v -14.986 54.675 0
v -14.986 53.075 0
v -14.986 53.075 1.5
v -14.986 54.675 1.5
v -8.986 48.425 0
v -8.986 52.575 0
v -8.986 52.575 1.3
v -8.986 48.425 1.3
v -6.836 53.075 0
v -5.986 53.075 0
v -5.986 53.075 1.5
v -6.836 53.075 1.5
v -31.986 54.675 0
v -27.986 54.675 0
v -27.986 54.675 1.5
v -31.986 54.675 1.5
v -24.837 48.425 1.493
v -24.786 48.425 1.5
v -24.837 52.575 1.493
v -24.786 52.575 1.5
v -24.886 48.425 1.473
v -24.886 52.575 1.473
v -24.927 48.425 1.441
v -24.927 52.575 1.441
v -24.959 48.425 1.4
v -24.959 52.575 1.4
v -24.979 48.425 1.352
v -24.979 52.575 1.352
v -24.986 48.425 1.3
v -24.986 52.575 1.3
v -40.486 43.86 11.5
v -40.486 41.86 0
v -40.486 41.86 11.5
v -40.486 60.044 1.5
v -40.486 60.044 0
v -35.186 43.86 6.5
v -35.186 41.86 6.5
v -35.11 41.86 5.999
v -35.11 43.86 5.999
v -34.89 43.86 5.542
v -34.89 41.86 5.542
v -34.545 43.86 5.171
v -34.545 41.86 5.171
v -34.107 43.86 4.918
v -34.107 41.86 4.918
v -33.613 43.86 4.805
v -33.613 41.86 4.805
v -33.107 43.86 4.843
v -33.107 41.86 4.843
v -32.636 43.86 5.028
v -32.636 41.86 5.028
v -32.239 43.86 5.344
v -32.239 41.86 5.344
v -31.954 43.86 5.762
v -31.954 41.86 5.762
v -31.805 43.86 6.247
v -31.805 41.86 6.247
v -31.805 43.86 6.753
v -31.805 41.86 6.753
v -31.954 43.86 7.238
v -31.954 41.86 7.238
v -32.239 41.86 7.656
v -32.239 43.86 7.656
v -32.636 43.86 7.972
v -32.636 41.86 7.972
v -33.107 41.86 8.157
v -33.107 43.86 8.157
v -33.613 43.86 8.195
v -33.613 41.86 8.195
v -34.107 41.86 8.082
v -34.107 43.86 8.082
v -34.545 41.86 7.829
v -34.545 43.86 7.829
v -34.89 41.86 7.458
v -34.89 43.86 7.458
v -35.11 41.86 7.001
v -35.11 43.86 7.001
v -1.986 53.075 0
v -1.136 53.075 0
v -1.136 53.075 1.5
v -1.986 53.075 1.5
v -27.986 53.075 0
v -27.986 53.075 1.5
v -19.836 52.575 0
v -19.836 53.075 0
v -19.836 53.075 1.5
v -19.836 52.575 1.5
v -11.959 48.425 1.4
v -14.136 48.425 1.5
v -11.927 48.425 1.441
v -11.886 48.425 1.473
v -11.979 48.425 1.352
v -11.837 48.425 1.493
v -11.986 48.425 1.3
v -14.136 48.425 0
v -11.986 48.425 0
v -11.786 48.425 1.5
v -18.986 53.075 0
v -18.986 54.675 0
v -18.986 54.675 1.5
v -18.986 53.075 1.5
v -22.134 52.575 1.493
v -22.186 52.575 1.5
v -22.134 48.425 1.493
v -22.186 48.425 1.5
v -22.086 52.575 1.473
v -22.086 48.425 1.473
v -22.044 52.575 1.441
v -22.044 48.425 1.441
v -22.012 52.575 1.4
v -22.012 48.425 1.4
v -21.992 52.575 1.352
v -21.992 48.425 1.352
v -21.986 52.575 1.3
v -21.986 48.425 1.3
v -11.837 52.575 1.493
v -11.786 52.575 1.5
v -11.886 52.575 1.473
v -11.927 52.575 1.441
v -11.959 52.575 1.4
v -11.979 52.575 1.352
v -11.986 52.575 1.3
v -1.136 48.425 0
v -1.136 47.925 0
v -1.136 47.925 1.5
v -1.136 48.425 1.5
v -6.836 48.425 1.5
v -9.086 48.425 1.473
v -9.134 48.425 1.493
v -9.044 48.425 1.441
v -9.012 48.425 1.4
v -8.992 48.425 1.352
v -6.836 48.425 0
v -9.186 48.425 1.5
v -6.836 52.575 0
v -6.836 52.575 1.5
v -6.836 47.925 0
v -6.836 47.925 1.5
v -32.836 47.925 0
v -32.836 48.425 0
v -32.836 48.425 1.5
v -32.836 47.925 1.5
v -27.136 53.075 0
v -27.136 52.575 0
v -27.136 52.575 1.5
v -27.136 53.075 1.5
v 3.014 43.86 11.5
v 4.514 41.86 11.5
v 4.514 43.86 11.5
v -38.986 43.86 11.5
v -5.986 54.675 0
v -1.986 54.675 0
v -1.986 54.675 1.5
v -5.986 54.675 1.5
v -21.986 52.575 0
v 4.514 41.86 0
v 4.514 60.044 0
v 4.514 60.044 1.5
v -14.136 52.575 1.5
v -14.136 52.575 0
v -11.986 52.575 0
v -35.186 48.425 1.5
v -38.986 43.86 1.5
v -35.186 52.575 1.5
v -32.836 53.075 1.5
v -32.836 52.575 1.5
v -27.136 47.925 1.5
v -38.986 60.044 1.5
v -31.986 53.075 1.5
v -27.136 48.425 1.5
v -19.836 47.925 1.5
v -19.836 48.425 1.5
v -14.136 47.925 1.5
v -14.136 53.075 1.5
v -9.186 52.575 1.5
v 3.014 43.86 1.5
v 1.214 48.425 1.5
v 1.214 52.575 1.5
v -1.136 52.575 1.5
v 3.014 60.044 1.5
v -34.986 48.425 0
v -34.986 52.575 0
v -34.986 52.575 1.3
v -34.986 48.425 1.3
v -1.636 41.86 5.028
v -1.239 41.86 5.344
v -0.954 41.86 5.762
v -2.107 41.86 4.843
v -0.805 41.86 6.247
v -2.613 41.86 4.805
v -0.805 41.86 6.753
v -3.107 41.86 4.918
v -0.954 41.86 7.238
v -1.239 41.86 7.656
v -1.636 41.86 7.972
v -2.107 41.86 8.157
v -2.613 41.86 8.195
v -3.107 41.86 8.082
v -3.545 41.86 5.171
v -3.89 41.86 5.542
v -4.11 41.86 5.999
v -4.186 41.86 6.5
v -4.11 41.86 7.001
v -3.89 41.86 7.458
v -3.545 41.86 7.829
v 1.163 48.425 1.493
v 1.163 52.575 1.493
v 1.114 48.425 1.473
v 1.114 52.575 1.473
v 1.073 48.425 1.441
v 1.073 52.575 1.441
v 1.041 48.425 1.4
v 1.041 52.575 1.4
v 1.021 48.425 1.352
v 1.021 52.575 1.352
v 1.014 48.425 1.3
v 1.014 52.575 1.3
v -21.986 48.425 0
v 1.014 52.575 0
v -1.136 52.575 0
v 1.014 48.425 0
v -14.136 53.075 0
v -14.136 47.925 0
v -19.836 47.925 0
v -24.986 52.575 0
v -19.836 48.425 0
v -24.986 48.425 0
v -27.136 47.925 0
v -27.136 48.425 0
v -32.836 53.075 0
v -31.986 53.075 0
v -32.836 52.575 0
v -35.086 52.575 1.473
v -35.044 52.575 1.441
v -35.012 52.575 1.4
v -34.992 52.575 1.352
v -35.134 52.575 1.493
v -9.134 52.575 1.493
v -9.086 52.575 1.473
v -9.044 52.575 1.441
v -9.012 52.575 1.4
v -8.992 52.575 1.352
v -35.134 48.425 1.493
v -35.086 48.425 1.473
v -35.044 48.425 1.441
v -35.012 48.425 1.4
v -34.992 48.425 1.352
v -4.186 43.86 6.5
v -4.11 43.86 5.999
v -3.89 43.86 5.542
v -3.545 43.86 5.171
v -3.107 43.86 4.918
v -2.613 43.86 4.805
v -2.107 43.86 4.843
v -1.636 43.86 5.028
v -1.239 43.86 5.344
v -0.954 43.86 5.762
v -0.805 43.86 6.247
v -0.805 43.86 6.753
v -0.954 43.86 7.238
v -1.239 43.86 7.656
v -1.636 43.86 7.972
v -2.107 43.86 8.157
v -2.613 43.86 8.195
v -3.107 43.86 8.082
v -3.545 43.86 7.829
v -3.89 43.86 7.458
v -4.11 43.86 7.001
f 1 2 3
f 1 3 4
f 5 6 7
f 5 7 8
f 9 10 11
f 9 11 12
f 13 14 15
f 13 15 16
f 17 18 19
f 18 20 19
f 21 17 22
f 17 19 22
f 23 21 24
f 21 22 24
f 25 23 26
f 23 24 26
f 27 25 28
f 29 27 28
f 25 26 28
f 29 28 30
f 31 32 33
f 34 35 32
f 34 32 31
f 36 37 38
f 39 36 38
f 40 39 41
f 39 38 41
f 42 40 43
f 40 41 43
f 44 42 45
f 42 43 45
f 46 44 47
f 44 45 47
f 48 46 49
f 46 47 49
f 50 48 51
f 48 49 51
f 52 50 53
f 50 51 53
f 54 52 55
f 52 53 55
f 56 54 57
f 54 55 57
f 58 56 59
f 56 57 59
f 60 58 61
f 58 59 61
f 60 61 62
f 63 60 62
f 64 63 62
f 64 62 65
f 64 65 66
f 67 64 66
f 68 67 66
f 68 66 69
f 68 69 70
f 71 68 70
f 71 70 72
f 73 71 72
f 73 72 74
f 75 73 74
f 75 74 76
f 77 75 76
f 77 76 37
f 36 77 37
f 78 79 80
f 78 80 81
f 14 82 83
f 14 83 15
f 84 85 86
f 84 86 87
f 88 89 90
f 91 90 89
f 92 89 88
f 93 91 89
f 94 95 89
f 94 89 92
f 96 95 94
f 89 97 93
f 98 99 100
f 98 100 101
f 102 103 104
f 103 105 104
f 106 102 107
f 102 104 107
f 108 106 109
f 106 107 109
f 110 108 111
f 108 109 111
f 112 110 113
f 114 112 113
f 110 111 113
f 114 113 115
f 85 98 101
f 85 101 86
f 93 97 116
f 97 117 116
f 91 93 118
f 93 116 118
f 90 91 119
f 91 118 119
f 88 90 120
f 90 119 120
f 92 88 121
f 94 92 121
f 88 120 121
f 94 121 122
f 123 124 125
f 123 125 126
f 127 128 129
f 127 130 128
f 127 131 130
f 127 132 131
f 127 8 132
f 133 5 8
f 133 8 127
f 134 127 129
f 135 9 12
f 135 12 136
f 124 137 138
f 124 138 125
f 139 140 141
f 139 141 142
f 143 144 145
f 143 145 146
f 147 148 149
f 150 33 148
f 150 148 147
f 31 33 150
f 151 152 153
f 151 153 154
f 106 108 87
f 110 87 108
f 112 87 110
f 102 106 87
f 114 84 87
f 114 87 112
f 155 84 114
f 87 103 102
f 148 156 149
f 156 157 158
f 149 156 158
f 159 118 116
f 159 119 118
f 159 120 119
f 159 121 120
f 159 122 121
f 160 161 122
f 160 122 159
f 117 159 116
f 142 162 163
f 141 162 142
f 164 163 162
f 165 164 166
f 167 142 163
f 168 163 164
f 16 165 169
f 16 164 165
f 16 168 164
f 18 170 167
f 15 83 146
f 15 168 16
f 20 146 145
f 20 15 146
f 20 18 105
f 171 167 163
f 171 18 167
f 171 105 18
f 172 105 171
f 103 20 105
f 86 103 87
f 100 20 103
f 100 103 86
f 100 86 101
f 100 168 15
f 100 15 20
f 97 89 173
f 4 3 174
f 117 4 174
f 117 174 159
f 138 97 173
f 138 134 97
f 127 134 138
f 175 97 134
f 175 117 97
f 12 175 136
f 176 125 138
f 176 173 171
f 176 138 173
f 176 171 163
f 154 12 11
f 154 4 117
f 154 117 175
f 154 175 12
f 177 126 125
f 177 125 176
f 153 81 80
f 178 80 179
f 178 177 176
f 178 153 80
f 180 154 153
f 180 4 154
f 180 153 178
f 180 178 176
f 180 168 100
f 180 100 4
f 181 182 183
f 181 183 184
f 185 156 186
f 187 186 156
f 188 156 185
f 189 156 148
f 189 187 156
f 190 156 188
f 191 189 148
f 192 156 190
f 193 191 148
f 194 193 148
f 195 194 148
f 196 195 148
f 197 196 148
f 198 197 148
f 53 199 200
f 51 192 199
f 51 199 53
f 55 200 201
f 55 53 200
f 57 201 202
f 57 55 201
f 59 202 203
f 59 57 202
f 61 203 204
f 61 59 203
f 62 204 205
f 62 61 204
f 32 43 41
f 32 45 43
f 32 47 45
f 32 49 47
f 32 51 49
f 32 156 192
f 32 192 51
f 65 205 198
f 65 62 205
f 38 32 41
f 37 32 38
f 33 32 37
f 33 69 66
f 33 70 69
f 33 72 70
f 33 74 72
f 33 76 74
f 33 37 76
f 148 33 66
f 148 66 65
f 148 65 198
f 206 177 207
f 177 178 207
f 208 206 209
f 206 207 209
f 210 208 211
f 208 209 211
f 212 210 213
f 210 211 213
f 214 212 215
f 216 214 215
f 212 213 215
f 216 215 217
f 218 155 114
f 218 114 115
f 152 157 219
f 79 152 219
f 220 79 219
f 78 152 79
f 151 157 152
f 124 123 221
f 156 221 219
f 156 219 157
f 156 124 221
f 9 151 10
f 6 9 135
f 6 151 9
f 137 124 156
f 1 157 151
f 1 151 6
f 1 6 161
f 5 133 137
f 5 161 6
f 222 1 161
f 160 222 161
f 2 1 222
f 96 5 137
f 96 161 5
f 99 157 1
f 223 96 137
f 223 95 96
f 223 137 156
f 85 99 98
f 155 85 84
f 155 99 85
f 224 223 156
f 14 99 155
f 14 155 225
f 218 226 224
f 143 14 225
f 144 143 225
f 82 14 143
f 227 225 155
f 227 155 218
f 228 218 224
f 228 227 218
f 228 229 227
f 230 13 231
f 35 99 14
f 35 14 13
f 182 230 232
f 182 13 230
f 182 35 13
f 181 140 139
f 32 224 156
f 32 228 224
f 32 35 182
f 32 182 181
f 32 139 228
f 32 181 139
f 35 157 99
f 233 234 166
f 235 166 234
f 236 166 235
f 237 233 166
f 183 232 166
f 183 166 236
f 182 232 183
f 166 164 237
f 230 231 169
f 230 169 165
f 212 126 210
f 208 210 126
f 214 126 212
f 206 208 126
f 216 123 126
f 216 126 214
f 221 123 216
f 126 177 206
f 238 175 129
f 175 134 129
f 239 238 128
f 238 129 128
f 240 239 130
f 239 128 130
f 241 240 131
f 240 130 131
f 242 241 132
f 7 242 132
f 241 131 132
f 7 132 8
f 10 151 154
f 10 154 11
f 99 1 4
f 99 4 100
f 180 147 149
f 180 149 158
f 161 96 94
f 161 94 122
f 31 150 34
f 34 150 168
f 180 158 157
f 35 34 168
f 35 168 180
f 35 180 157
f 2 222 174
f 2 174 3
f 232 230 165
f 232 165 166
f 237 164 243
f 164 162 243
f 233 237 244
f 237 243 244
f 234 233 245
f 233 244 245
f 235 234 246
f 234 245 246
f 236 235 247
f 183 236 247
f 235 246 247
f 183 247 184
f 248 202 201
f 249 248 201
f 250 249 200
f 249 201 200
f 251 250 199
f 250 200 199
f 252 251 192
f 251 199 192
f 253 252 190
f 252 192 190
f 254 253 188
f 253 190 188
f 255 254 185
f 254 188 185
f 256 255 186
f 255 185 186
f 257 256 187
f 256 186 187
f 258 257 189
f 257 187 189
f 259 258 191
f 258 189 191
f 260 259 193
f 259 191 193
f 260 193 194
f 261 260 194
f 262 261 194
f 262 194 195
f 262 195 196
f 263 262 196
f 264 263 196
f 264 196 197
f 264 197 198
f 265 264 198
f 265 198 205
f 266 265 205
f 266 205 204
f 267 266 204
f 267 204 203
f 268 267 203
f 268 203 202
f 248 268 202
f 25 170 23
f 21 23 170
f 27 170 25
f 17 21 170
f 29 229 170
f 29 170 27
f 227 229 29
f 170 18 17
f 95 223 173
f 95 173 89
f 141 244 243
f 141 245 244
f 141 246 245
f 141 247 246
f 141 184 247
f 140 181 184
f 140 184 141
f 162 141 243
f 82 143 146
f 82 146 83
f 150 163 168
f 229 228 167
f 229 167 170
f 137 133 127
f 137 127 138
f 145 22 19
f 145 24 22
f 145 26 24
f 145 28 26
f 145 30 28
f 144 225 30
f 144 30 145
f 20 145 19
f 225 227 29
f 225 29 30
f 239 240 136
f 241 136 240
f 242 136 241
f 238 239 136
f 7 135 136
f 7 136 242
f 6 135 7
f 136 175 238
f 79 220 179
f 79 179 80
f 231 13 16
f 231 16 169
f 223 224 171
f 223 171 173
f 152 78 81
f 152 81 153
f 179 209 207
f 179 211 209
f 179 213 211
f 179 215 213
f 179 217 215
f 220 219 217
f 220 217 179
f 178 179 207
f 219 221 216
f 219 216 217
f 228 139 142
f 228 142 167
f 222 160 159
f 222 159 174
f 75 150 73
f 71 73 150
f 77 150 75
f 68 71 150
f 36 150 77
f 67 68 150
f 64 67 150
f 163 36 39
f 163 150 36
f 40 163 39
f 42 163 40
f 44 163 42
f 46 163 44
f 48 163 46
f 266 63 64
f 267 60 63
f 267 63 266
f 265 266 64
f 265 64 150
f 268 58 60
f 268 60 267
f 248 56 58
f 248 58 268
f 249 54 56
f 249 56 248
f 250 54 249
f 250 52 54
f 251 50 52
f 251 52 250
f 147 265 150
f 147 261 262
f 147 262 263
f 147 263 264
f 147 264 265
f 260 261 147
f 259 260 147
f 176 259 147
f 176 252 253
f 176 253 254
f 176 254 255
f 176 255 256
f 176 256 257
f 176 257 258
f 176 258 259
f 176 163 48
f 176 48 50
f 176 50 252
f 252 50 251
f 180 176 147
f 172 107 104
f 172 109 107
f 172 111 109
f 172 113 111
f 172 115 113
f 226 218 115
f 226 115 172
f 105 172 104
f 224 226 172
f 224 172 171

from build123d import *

# Parameters (mm, degrees)
SKETCH1_W            = 42
SKETCH1_H            = 18.183578202
BOSS_EXTRUDE1_DEPTH  = 1.5
SKETCH2_W            = 42
SKETCH2_H            = 2
BOSS_EXTRUDE2_DEPTH  = 10
BOSS_EXTRUDE4_DEPTH  = 1.5
BOSS_EXTRUDE5_START  = -42
BOSS_EXTRUDE5_DEPTH  = 1.5
M3_CLEARANCE_HOLE2_D = 3.4
FILLET4_R            = 0.2


with BuildPart() as part:
    # Sketch1 → Boss-Extrude1 (new body)
    with BuildSketch(Plane.XY):
        with Locations((-17.985553167, 50.952165471)):
            Rectangle(SKETCH1_W, SKETCH1_H)
        Polygon((-27.135553167, 52.575255776), (-27.135553167, 53.075255776), (-27.985553167, 53.075255776), (-27.985553167, 54.675255776), (-31.985553167, 54.675255776), (-31.985553167, 53.075255776), (-32.835553167, 53.075255776), (-32.835553167, 52.575255776), (-34.985553167, 52.575255776), (-34.985553167, 48.425255776), (-32.835553167, 48.425255776), (-32.835553167, 47.925255776), (-27.135553167, 47.925255776), (-27.135553167, 48.425255776), (-24.985553167, 48.425255776), (-24.985553167, 52.575255776), align=None, mode=Mode.SUBTRACT)
        Polygon((-14.135553167, 52.575255776), (-14.135553167, 53.075255776), (-14.985553167, 53.075255776), (-14.985553167, 54.675255776), (-18.985553167, 54.675255776), (-18.985553167, 53.075255776), (-19.835553167, 53.075255776), (-19.835553167, 52.575255776), (-21.985553167, 52.575255776), (-21.985553167, 48.425255776), (-19.835553167, 48.425255776), (-19.835553167, 47.925255776), (-14.135553167, 47.925255776), (-14.135553167, 48.425255776), (-11.985553167, 48.425255776), (-11.985553167, 52.575255776), align=None, mode=Mode.SUBTRACT)
        Polygon((-1.135553167, 52.575255776), (-1.135553167, 53.075255776), (-1.985553167, 53.075255776), (-1.985553167, 54.675255776), (-5.985553167, 54.675255776), (-5.985553167, 53.075255776), (-6.835553167, 53.075255776), (-6.835553167, 52.575255776), (-8.985553167, 52.575255776), (-8.985553167, 48.425255776), (-6.835553167, 48.425255776), (-6.835553167, 47.925255776), (-1.135553167, 47.925255776), (-1.135553167, 48.425255776), (1.014446833, 48.425255776), (1.014446833, 52.575255776), align=None, mode=Mode.SUBTRACT)
    extrude(amount=BOSS_EXTRUDE1_DEPTH)

    # Sketch2 → Boss-Extrude2 (add)
    with BuildSketch(Plane.XY.offset(1.5)):
        with Locations((-17.985553167, 42.86037637)):
            Rectangle(SKETCH2_W, SKETCH2_H)
    extrude(amount=BOSS_EXTRUDE2_DEPTH)

    # Sketch7 → Boss-Extrude4 (add)
    with BuildSketch(Plane.ZY.offset(38.985553167)):
        Polygon((11.5, 43.86037637), (1.5, 60.043954572), (0, 60.043954572), (0, 41.86037637), (11.5, 41.86037637), align=None)
    extrude(amount=BOSS_EXTRUDE4_DEPTH)

    # Sketch7<3> → Boss-Extrude5 (add)
    with BuildSketch(Plane.ZY.offset(38.985553167).offset(BOSS_EXTRUDE5_START)):
        Polygon((11.5, 43.86037637), (1.5, 60.043954572), (0, 60.043954572), (0, 41.86037637), (11.5, 41.86037637), align=None)
    extrude(amount=-BOSS_EXTRUDE5_DEPTH)

    # M3 Clearance Hole2 (through all)
    with Locations(Plane(origin=(0, 43.86037637, 0), x_dir=(1, 0, 0), z_dir=(0, 1, 0))):
        with Locations((-33.485553167, -6.5), (-2.485553167, -6.5)):
            Hole(M3_CLEARANCE_HOLE2_D / 2)

    # Fillet4
    fillet4_edges = [part.edges().sort_by_distance(p)[0] for p in [
        (-34.985553167, 50.500255776, 1.5),
        (-24.985553167, 50.500255776, 1.5),
        (-21.985553167, 50.500255776, 1.5),
        (-11.985553167, 50.500255776, 1.5),
        (-8.985553167, 50.500255776, 1.5),
        (1.014446833, 50.500255776, 1.5),
    ]]
    fillet(fillet4_edges, radius=FILLET4_R)


solid = part.part
